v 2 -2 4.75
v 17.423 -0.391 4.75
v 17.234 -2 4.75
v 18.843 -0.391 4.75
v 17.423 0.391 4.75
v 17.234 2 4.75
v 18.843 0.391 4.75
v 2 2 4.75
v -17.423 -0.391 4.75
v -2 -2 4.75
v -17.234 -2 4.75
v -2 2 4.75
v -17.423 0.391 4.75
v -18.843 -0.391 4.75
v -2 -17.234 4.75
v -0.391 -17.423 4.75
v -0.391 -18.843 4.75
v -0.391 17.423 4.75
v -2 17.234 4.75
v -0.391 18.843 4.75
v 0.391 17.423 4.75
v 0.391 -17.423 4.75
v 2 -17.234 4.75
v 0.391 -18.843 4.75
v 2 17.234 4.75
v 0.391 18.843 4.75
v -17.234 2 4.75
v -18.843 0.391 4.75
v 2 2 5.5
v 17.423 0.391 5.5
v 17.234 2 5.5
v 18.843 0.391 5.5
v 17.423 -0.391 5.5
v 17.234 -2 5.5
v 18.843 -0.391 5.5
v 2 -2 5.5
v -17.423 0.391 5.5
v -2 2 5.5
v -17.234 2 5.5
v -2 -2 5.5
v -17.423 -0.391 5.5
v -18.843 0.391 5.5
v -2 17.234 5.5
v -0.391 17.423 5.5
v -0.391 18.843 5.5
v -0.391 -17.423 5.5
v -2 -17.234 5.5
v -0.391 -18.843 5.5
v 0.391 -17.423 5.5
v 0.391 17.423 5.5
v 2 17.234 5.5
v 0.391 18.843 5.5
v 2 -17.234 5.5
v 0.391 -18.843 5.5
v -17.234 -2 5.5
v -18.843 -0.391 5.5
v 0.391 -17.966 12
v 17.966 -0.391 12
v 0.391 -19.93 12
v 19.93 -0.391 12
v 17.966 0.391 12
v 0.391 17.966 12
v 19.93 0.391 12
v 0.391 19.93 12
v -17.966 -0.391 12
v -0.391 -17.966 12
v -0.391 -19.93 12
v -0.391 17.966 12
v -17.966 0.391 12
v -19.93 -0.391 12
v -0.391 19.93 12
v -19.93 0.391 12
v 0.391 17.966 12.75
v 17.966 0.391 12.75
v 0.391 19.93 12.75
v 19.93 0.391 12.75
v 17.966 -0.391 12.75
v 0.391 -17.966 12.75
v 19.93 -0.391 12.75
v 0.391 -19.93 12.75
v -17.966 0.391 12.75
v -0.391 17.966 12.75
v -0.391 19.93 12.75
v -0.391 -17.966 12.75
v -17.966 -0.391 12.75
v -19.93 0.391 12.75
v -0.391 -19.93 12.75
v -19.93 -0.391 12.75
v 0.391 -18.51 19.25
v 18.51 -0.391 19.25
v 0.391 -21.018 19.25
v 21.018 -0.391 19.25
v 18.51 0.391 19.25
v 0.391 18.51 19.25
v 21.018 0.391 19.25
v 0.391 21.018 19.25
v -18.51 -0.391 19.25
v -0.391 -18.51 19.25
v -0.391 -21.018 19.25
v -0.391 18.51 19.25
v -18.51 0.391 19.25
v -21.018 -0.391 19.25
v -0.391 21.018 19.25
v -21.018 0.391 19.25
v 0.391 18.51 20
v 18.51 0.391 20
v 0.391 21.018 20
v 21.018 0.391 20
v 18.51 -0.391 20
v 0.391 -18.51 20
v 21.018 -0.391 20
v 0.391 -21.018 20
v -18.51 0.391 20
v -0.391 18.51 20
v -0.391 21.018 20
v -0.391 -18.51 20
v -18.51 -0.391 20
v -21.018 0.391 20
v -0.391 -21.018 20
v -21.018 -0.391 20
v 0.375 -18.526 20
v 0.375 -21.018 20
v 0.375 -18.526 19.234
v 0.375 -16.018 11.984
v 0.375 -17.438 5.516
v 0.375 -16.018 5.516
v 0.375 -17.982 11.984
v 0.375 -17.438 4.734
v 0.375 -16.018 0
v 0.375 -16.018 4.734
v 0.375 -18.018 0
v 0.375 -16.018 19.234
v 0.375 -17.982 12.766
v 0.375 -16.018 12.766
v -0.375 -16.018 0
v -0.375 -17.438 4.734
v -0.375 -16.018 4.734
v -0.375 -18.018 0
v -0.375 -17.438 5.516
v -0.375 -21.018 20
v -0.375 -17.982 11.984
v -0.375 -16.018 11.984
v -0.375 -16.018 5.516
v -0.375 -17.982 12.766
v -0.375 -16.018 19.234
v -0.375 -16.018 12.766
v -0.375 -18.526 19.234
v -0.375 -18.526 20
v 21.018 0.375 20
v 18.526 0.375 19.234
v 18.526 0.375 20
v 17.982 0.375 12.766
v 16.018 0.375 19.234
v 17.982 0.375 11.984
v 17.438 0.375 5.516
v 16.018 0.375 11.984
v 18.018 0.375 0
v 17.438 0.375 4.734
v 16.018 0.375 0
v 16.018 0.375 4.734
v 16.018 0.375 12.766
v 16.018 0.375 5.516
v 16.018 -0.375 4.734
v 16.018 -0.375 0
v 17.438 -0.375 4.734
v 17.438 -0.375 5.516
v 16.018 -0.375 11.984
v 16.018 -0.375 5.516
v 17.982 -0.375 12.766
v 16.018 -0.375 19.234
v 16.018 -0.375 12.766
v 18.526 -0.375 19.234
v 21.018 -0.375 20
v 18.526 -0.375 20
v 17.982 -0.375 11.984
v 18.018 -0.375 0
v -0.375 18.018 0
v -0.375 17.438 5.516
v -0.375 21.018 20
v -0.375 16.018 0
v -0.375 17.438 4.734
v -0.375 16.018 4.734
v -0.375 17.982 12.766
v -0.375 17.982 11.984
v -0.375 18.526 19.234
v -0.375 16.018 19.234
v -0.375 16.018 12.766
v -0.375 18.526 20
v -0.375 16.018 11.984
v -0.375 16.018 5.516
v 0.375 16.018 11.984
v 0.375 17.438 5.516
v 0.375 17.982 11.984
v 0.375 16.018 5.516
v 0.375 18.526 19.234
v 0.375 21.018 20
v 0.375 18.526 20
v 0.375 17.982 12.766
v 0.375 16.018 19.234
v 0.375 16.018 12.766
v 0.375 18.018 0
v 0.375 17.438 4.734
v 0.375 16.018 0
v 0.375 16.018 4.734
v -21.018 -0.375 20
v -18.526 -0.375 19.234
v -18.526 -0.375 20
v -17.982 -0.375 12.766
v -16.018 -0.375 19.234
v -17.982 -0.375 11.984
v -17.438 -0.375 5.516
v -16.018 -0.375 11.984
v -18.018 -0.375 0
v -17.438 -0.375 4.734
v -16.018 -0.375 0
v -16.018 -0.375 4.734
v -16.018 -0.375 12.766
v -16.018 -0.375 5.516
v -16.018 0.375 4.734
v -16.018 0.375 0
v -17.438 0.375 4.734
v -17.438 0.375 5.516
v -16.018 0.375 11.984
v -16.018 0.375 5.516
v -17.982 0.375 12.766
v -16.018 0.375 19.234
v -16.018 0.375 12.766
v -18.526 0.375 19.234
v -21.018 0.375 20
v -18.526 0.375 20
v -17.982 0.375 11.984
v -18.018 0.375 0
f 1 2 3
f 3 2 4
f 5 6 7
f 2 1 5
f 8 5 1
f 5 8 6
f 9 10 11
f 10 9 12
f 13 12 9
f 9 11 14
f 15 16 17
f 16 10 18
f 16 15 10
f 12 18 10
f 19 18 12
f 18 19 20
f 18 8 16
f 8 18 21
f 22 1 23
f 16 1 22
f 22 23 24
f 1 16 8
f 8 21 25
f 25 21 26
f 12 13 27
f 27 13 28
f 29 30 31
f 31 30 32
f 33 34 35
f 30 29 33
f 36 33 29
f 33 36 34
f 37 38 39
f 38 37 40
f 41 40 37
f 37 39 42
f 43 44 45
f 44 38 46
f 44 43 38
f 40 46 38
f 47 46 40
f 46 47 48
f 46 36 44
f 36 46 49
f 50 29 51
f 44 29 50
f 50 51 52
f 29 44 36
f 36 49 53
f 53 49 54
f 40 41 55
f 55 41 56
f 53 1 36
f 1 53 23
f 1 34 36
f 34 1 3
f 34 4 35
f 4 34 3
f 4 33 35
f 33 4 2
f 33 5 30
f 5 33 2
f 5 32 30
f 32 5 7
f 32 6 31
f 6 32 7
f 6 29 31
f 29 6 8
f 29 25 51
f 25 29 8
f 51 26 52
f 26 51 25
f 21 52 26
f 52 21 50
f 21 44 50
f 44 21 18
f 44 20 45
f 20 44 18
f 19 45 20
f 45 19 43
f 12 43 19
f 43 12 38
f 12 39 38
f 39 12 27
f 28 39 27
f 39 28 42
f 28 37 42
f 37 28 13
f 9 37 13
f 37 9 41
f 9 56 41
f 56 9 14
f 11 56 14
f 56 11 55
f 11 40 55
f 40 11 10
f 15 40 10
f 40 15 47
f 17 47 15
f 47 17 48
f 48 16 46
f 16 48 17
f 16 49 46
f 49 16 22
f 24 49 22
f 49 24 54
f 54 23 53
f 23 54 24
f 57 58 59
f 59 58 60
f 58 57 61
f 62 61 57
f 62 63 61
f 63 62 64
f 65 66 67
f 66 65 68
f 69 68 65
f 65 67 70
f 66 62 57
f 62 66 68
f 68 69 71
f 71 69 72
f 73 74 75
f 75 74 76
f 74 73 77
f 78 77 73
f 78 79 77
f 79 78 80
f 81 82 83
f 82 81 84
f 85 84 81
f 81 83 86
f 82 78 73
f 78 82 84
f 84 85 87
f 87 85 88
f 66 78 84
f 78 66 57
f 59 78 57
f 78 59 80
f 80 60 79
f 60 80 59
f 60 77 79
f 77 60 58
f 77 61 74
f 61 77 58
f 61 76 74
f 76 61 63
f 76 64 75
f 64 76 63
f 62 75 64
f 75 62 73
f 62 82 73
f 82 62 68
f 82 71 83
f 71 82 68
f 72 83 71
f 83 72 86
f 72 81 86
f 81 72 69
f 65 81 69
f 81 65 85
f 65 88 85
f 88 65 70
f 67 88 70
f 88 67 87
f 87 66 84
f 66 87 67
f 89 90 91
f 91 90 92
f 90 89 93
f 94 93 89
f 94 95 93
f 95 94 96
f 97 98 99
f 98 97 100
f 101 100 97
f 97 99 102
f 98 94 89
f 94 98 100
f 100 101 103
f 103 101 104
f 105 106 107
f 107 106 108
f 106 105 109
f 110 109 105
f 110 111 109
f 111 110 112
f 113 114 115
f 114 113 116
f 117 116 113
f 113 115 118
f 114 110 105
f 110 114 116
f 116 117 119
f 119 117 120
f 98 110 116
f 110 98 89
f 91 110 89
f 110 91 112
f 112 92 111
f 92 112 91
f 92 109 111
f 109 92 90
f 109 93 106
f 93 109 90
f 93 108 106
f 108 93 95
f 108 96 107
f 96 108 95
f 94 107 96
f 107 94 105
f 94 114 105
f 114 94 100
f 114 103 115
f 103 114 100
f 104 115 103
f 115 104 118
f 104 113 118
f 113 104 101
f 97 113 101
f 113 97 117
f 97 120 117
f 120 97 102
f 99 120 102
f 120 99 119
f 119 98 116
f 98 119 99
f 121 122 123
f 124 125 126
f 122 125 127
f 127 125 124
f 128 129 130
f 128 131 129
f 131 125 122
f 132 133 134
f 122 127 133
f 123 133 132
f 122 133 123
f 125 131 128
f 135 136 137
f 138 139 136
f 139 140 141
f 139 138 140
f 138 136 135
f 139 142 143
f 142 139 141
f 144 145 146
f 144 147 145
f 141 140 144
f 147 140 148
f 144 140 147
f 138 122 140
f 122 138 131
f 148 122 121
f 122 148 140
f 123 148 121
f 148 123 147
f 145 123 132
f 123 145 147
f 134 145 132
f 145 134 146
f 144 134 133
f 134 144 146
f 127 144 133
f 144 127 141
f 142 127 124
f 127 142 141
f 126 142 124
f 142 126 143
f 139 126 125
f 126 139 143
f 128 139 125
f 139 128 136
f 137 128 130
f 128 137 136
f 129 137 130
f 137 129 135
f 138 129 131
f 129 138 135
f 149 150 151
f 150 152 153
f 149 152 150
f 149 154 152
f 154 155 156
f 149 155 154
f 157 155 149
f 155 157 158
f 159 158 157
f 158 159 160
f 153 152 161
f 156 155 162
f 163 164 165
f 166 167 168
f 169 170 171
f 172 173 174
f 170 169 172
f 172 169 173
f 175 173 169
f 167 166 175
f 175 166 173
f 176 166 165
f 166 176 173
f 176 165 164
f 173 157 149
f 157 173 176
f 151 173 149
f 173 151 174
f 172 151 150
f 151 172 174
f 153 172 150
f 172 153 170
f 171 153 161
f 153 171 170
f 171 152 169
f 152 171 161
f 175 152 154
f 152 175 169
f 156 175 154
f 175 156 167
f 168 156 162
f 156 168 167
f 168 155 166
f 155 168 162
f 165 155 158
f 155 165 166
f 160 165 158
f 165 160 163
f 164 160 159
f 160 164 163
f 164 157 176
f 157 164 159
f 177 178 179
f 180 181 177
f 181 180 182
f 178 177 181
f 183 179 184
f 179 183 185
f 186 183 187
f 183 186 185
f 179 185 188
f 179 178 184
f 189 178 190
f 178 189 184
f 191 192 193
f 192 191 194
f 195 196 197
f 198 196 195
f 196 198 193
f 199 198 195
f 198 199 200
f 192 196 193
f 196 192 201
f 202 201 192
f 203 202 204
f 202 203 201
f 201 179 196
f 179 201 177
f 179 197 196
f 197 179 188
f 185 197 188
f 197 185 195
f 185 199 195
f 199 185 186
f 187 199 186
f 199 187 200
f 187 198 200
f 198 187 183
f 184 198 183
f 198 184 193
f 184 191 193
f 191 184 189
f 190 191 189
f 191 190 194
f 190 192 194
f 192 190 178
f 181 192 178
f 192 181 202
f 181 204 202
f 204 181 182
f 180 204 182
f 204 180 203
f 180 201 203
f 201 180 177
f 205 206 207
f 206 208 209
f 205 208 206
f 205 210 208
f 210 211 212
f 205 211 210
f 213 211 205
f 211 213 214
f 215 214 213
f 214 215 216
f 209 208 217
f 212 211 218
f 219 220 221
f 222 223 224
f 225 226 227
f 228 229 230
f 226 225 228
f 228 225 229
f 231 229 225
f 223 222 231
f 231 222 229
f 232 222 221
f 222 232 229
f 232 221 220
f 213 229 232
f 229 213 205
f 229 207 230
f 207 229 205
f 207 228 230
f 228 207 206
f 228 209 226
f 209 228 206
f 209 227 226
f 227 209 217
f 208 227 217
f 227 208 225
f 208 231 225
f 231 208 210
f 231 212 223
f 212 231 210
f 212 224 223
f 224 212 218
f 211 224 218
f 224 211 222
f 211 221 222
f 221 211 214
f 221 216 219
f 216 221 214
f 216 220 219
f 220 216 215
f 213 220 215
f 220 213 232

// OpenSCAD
// file: ../src/functions.scad
module shelf(type, diameter,leg_width) {
    if (type == 0)
    round_shelf(diameter, leg_width);
    if (type == 1)
    square_shelf(diameter, leg_width);
    if (type == 2)
    square_shelf_leg_supports(diameter, leg_width);
}

module round_shelf(diameter,leg_width) {
    difference() {
        circle(d=diameter);
        leg_slots(diameter, leg_width);
    }
}

module square_shelf(diameter,leg_width) {
    difference() {
        hull() {
            leg_slots(diameter, leg_width);
        }
        leg_slots(diameter, leg_width);
    }
}

module square_shelf_leg_supports(diameter,leg_width) {
    intersection() {
        square_shelf(diameter, leg_width);
        for(i=[0:leg_count-1]) {
            rotate(i*360/leg_count)
            translate([-leg_support/2,-diameter/2])
            square([leg_support,diameter/2]);
        }
    }
}


module leg_slots(diameter, leg_width) {
    for(i=[0:leg_count-1]) {
        rotate(i*360/leg_count)
        translate([-leg_thick/2-gap,-diameter/2])
        square([leg_thick+gapp,leg_width]);
    }
}

module shelf_number(i) {
        shelf(shelves[i], tan(leg_angle)*((top_height-leg_height)/(shelf_count-1)*i+leg_height)*2+bottom,(tan(leg_angle)*((top_height-leg_height)/(shelf_count-1)*i+leg_height)+min_leg)/2+gap/2);
}

module assemble_shelves() {
    for(i=[0:shelf_count-1]) {
        translate([0,0,(top_height-leg_height)/(shelf_count-1)*i+leg_height-plywood])
        linear_extrude(height=plywood)
        shelf_number(i);
    }
}

module assemble_legs() {
    for(i=[0:leg_count-1]) {
        rotate(i*360/leg_count)
        translate([-leg_thick/2-plywood/2,0,0])
        for(l=[1:leg_layers]) {
            translate([plywood*l,0,0])
            leg_3d();
        }
    }
}

//shelf(bottom,min_leg);

module leg() {
    difference() {
        square([min_leg+(top-bottom)/2,top_height]);
        translate([min_leg,0])
        rotate(-leg_angle)
        square([min_leg+(top-bottom),top_height*2]);
        for(i=[0:shelf_count-1]) {
            translate([0,(top_height-leg_height)/(shelf_count-1)*i+leg_height-plywood-gap])
            square([(tan(leg_angle)*((top_height-leg_height)/(shelf_count-1)*i+leg_height)+min_leg)/2+gap/2,plywood+gapp]);
        }
            
    }
}

module leg_3d() {
    translate([0,-bottom/2+min_leg,0])
    rotate([90,0,-90])
    translate([0,0,-plywood/2])
    color("lime")
    linear_extrude(height=plywood)
    leg();
}

module assemble() {
    assemble_shelves();
    assemble_legs();
}

module plate() {
    for(i=[0:leg_count/2-1]) {
        translate([i*((top-bottom)/2+min_leg*2+tree*2),0]) {
            leg();
            translate([min_leg+(top-bottom)/2+tree+min_leg,top_height])
            rotate(180)
            leg();
        }
    }
    if(leg_count%2 != 0) {
            translate([floor(leg_count/2)*((top-bottom)/2+min_leg*2+tree*2),0])
            leg();
    }
    translate([0,-top/2-tree])
    for(i=[0:shelf_count-1]) {
        //too much math, I can drag in inkscape
        translate([top*i,0])
        shelf_number(i);
    }
}
// main file
include <../src/functions.scad>;

square_top=30;
shelves = [2, 1, 1];
// 0 = round
// 1 = square
// 2 = leg_supports (square)
shelf_count = len(shelves);
leg_layers=1;
leg_count = 4;
leg_height = 5.5; // bottom shelf
top_height = 20+sin($t*360)*12;
min_leg = 2; //smallest size a leg can be
plywood = 0.75;
gap = 1/64;
gapp = gap*2;
pad = 0.1;
padd = pad*2;
leg_thick=plywood*leg_layers;

leg_support=4;

tree=2;

top = sqrt(2*pow((square_top/2),2))*2-leg_thick/2-gap; //diameter
bottom = top-6; //diameter
leg_angle = atan((top-bottom)/2/top_height);
echo("top is", top);

$fn=120;


// RENDER gif
module demo() {
    assemble();
}

demo();
